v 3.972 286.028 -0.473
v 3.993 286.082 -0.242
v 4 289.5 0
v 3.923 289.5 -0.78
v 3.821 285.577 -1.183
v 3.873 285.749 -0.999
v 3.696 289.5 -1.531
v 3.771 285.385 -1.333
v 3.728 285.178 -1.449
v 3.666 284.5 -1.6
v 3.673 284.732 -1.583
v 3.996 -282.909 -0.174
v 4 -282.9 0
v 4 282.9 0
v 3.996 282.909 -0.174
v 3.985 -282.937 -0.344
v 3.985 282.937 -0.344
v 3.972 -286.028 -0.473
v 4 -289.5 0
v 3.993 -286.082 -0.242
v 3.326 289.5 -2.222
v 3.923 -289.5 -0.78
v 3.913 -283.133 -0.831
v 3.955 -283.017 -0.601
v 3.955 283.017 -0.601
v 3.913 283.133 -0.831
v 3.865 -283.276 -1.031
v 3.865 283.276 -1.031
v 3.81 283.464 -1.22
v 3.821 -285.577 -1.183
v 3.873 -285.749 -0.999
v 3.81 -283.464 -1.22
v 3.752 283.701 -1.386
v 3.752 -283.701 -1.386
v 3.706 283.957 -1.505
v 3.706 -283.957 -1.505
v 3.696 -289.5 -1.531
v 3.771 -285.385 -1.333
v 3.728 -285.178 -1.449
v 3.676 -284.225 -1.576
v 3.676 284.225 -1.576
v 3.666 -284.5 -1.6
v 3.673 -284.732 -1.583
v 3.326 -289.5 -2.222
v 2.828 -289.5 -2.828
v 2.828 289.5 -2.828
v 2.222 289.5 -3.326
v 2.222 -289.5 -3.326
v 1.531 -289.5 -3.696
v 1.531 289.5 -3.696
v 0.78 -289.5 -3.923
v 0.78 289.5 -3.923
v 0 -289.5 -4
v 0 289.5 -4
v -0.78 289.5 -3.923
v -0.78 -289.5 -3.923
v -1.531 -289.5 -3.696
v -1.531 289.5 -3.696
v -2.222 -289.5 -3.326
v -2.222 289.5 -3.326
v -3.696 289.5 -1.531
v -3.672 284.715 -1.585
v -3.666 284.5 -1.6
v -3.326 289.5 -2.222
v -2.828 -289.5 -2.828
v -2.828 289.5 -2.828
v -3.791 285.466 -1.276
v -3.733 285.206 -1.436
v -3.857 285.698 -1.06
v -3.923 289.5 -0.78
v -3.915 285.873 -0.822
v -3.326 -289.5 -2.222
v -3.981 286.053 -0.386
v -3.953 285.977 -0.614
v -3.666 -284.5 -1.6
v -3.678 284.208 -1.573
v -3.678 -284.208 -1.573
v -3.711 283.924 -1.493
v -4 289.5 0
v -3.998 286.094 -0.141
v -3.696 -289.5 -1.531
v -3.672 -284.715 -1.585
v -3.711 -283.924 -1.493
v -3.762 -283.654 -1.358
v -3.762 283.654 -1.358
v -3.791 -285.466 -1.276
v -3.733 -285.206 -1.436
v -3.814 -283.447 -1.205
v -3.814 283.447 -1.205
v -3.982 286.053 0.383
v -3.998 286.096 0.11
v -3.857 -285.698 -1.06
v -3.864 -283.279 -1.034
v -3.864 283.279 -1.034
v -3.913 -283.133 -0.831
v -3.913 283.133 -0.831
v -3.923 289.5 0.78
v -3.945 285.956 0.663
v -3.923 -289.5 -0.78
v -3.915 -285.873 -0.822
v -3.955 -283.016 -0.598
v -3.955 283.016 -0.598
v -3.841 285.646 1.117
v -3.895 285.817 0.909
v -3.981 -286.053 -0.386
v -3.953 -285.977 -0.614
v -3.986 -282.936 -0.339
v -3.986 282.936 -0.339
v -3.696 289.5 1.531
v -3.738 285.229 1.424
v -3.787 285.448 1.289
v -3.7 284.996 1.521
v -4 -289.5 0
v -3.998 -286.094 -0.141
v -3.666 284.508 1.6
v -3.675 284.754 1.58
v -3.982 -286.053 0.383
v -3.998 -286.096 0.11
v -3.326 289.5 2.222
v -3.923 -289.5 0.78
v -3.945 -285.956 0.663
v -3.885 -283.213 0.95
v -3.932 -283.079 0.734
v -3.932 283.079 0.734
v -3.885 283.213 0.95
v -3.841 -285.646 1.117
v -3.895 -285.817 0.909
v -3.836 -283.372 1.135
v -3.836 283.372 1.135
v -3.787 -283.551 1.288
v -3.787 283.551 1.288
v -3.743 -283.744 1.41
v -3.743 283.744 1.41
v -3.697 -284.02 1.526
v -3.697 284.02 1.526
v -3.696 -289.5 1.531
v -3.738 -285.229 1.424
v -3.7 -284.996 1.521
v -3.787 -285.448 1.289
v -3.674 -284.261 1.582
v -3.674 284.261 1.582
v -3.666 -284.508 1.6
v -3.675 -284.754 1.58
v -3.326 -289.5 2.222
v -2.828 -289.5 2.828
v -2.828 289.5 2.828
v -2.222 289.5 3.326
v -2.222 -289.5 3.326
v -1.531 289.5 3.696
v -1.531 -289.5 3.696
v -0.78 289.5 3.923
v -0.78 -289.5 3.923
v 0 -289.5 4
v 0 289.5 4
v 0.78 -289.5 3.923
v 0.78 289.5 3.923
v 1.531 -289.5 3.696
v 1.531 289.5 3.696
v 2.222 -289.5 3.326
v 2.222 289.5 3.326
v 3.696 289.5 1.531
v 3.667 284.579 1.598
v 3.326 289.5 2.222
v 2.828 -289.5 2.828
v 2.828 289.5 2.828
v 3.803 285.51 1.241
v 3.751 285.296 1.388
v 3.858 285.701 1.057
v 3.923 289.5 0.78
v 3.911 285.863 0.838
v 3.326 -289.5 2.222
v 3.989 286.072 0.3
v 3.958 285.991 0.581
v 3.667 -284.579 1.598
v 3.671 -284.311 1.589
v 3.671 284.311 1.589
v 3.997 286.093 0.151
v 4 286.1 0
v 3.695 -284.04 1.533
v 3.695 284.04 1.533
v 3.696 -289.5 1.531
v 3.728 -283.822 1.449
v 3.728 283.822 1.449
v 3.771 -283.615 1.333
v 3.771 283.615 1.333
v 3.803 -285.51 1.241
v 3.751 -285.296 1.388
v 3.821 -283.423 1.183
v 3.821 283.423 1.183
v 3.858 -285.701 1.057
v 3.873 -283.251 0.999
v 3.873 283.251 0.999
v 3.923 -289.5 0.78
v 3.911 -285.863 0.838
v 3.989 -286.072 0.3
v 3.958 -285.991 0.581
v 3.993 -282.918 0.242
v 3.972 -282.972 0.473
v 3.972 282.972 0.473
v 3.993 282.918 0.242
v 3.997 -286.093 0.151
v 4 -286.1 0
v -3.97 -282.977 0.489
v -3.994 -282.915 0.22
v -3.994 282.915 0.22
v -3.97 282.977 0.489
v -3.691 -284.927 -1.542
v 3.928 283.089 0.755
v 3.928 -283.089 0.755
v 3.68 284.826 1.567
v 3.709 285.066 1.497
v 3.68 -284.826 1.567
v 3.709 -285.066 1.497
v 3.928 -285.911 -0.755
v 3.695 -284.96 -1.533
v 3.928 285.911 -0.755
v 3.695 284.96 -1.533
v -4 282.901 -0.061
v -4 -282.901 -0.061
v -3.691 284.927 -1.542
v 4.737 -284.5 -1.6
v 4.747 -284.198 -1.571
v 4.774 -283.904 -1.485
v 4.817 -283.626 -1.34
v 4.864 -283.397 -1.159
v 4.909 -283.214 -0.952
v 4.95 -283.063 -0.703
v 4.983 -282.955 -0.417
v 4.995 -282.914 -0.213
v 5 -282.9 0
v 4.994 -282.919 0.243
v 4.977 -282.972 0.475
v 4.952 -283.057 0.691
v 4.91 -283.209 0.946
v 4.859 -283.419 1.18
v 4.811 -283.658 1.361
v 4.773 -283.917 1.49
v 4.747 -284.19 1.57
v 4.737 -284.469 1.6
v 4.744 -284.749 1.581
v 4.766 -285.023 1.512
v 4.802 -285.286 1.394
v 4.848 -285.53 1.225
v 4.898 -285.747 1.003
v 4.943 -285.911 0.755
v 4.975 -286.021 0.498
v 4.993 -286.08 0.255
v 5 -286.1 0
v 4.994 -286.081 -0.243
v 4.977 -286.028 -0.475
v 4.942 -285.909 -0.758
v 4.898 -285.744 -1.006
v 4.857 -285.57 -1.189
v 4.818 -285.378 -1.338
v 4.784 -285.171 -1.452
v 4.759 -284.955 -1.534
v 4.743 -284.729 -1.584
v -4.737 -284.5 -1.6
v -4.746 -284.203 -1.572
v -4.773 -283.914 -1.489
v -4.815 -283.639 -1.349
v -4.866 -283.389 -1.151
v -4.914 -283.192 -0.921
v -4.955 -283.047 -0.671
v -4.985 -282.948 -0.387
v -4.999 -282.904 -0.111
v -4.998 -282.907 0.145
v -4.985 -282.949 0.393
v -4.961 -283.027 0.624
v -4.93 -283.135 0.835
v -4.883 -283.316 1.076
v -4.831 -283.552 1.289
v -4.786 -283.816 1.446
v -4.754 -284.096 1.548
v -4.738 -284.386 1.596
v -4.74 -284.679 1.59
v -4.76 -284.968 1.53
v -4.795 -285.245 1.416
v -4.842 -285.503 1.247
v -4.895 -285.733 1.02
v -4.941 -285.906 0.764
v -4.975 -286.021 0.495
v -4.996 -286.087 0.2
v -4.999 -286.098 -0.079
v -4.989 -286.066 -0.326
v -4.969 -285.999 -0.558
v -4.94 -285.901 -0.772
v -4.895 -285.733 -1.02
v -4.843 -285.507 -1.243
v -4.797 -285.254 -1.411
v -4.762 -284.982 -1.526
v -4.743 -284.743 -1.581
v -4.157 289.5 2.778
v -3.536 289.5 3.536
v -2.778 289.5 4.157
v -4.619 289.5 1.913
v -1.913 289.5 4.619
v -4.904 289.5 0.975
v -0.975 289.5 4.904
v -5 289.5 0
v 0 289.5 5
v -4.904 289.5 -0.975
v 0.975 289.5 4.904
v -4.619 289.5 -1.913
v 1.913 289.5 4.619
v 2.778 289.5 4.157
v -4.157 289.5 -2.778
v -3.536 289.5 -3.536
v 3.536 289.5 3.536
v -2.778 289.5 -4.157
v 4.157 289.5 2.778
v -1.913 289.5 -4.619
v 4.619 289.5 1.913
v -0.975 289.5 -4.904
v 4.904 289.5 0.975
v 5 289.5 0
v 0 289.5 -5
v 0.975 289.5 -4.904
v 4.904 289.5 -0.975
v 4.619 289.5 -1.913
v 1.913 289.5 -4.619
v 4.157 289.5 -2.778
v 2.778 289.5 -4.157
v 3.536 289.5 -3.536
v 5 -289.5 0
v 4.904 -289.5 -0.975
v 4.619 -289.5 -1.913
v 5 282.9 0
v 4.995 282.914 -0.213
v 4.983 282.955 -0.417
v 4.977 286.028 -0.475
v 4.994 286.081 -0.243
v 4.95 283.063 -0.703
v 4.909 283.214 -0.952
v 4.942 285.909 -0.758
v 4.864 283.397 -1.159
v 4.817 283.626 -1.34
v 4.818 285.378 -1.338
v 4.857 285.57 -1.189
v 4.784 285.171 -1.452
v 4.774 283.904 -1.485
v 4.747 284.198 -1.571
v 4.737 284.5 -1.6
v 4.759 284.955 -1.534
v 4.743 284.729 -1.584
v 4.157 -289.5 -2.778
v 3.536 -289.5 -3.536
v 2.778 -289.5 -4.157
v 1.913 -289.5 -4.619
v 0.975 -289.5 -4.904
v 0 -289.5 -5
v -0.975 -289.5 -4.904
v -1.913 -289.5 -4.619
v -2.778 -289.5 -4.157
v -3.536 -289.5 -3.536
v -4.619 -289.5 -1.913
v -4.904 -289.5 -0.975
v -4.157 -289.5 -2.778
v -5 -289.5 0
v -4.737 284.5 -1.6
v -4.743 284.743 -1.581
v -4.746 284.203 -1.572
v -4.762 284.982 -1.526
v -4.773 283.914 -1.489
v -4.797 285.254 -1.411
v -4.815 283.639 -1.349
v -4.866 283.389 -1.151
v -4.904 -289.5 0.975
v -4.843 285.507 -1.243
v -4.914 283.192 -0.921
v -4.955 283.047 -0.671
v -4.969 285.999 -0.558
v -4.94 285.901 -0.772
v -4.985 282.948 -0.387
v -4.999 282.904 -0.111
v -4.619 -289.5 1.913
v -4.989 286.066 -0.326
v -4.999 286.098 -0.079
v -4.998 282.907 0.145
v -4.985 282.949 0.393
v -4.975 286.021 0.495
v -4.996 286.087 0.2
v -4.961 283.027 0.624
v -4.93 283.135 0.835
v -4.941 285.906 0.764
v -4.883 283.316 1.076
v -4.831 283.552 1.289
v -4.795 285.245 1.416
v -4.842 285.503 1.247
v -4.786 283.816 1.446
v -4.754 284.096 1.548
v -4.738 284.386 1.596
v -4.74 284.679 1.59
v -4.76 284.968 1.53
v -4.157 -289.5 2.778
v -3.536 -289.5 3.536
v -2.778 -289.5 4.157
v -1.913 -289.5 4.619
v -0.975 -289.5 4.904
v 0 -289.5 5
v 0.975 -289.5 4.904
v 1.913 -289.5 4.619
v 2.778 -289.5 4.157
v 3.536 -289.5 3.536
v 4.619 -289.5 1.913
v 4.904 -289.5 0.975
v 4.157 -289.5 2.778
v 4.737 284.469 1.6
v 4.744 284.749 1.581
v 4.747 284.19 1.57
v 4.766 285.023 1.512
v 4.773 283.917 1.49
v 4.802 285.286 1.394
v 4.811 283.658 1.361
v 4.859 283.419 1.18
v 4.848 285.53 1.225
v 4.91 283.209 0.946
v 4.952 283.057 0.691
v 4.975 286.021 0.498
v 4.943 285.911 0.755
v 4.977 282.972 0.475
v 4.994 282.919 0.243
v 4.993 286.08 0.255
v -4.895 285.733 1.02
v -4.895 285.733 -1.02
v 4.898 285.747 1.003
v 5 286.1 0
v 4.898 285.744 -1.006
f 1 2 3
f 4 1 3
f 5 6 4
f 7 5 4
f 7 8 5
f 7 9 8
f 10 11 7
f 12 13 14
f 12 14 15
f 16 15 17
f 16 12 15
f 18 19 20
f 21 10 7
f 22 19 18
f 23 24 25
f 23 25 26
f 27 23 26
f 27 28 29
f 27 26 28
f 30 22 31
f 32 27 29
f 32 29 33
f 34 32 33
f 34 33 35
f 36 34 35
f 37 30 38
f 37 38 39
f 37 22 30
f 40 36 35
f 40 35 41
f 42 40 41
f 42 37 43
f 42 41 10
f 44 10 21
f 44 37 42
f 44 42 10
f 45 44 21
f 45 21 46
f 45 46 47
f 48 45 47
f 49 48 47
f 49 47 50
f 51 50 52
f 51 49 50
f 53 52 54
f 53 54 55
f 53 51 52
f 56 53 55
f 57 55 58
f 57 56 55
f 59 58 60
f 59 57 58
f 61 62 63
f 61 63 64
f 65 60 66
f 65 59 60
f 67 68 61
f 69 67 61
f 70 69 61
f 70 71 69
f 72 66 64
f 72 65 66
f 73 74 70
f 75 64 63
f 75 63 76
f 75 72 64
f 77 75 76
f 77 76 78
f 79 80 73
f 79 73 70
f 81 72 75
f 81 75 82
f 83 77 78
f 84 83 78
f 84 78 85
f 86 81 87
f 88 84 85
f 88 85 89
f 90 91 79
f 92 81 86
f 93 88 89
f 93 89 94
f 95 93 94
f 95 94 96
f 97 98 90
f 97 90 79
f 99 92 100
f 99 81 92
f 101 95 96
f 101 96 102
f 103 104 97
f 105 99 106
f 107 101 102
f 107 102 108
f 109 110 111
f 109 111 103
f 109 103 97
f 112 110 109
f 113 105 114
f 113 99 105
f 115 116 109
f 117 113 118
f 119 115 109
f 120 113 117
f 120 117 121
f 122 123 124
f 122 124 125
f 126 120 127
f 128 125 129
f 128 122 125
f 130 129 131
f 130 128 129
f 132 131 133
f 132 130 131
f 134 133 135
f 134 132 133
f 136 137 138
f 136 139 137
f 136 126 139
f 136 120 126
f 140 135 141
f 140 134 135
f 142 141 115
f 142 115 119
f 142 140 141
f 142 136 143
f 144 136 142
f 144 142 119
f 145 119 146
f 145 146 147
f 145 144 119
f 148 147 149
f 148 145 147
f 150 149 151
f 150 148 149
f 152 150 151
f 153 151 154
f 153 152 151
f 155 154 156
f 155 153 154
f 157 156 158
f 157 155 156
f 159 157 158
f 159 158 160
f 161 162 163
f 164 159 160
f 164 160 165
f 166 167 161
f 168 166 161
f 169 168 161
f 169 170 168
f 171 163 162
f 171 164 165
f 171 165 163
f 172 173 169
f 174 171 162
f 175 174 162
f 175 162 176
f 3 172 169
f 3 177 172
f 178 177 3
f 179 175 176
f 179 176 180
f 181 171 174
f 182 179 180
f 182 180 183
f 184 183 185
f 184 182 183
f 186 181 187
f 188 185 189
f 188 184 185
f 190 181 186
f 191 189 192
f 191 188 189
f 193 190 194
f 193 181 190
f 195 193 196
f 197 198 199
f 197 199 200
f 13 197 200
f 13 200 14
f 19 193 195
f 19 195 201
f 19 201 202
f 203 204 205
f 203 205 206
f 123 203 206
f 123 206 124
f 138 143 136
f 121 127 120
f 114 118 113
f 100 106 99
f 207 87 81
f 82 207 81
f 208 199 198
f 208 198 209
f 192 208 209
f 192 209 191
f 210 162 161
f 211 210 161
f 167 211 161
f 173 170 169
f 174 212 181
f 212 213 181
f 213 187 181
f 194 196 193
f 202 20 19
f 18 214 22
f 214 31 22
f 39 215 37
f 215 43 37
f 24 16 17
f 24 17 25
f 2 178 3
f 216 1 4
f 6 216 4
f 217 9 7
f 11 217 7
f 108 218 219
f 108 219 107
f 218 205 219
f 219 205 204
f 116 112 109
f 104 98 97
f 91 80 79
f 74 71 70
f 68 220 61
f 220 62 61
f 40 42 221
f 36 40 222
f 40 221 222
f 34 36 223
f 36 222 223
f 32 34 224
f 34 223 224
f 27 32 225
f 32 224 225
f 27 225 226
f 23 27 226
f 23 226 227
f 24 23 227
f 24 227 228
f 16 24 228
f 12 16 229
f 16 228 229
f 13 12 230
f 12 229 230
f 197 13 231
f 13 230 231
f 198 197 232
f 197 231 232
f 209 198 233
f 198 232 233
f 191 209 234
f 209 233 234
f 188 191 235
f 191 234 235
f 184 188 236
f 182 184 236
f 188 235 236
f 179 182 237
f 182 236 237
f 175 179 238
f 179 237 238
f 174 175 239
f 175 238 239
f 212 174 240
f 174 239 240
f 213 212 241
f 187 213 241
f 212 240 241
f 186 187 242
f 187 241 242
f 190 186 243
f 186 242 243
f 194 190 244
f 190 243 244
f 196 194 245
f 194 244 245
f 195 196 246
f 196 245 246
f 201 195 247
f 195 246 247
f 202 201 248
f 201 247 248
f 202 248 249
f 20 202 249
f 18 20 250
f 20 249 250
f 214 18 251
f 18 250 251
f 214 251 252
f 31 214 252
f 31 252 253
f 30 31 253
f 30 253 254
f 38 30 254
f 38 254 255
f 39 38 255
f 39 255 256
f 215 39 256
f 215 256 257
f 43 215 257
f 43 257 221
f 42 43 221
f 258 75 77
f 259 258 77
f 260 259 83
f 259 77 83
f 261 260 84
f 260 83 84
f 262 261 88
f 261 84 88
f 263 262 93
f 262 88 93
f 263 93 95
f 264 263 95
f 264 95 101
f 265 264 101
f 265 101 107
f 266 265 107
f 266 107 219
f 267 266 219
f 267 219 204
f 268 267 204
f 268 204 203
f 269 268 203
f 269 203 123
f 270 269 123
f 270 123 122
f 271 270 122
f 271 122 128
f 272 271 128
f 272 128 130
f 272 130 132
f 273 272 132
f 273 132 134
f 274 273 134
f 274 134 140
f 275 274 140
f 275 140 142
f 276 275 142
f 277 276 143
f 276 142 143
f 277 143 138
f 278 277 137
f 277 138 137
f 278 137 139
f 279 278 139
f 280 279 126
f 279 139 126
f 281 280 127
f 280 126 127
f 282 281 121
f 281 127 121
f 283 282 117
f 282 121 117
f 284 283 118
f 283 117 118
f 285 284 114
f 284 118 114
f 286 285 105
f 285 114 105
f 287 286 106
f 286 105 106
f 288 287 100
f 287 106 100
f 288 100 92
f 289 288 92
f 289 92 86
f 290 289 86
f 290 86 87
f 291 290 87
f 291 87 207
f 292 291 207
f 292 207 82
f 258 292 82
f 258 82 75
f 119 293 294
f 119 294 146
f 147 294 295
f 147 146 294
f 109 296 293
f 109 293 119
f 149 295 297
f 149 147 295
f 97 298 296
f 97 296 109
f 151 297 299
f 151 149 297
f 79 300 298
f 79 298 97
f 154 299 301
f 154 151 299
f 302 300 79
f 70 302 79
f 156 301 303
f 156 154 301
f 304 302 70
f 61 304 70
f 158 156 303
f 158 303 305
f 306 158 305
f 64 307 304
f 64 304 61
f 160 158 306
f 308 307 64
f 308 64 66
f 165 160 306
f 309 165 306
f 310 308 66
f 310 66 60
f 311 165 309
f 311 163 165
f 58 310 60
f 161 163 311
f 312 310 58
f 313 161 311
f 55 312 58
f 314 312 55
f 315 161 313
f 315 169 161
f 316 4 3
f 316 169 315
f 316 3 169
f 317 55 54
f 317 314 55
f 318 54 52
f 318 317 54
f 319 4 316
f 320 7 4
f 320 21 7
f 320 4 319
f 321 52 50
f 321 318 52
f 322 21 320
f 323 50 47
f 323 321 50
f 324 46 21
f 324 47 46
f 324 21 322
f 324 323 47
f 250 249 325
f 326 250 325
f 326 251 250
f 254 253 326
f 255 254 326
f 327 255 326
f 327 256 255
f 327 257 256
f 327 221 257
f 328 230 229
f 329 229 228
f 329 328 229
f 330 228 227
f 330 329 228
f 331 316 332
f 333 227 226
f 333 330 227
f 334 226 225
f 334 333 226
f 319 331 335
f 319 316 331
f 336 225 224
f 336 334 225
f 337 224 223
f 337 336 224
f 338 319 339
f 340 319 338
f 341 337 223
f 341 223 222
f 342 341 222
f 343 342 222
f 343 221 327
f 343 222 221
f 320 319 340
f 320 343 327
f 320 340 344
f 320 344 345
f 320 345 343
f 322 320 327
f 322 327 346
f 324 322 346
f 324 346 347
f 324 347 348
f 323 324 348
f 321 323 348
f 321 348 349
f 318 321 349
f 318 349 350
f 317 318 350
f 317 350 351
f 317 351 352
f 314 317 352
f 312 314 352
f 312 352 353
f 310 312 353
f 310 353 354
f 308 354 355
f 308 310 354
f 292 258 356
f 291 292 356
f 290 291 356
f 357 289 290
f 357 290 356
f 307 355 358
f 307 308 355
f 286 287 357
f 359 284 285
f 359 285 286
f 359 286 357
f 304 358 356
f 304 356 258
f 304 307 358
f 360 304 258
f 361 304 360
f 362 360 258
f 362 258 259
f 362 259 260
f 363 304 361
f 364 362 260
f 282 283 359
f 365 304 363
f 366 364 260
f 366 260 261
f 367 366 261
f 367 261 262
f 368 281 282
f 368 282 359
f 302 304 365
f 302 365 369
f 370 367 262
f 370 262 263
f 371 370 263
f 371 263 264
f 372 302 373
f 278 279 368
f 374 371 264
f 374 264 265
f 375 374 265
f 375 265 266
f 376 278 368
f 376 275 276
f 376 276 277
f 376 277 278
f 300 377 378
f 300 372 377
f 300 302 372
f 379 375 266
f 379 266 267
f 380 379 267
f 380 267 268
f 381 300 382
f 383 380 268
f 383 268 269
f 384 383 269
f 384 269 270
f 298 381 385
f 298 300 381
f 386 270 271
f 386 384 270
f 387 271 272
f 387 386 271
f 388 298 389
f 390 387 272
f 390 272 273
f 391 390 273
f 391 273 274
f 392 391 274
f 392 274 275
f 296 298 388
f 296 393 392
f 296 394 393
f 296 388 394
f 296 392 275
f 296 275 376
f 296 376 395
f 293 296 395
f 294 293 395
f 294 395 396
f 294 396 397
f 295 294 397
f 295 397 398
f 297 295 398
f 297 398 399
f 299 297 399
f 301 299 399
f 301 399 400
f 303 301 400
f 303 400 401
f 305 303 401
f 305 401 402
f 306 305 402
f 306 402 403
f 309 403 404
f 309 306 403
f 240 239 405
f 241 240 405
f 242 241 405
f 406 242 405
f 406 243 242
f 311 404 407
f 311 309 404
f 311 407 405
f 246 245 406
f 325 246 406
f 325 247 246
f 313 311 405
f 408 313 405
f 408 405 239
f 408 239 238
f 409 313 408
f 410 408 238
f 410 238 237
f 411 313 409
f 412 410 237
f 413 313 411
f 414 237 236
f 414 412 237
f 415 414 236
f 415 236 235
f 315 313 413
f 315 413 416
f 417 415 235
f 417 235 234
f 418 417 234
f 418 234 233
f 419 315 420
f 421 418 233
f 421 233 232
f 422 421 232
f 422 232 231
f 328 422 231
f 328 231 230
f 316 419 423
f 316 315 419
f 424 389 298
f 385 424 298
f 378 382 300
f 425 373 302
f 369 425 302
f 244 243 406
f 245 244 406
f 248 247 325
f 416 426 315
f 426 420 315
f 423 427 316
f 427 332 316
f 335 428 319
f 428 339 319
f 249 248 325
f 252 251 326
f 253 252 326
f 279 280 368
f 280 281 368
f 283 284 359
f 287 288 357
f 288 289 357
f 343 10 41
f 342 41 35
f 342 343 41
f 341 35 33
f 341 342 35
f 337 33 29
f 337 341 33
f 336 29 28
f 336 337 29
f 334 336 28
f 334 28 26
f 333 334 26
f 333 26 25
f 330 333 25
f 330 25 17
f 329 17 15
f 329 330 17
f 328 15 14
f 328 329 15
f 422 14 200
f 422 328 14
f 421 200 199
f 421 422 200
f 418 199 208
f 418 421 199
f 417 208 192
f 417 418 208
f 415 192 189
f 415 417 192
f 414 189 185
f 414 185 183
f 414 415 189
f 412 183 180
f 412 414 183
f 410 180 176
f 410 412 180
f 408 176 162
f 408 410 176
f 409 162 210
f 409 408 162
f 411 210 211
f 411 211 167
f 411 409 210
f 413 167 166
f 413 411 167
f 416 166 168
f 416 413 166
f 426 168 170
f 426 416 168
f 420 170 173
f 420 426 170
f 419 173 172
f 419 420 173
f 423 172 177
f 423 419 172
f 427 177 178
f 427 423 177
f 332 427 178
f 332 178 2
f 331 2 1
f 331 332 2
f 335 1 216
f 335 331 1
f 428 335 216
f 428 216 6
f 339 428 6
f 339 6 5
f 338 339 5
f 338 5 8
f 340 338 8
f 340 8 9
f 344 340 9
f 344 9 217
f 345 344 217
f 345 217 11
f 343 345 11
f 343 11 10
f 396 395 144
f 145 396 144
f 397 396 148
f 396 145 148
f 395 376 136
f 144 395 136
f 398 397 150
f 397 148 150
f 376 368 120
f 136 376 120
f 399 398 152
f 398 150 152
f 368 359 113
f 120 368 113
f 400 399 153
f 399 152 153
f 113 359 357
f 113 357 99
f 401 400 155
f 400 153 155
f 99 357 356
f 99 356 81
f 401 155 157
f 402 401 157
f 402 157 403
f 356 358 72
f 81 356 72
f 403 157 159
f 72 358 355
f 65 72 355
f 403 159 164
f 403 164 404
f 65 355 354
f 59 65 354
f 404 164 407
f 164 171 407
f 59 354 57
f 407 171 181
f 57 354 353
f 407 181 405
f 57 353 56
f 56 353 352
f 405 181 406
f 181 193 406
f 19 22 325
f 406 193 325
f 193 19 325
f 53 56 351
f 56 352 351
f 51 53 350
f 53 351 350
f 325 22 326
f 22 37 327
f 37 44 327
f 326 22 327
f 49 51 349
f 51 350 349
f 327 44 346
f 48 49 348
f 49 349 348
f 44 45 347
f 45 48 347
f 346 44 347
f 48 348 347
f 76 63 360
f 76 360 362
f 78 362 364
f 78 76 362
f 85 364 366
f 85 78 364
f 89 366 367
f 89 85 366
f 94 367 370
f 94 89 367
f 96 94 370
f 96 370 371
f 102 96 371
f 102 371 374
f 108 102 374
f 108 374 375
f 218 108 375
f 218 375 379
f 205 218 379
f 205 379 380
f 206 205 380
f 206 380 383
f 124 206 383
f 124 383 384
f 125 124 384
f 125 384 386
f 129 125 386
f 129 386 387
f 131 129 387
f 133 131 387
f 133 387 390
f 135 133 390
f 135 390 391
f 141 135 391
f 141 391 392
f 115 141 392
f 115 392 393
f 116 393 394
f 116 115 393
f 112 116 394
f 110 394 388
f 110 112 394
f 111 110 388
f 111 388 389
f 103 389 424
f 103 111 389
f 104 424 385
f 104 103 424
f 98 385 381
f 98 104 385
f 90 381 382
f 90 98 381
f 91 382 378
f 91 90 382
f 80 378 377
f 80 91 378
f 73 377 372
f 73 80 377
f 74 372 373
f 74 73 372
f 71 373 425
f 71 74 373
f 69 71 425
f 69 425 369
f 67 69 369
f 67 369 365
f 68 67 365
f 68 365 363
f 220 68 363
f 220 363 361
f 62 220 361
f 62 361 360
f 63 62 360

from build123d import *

# Parameters (mm, degrees)
SKETCH1_R            = 5
SKETCH1_R_2          = 4
BOSS_EXTRUDE1_DEPTH  = 289.5
M3_CLEARANCE_HOLE1_D = 3.2


with BuildPart() as part:
    # Sketch1 → Boss-Extrude1 (new, symmetric)
    with BuildSketch(Plane(origin=(0, 0, 0), x_dir=(1, 0, 0), z_dir=(0, 1, 0))):
        Circle(SKETCH1_R)
        Circle(SKETCH1_R_2, mode=Mode.SUBTRACT)
    extrude(amount=BOSS_EXTRUDE1_DEPTH, both=True)

    # M3 Clearance Hole1 (through all)
    with Locations(Plane.ZY.offset(5)):
        with Locations((0, -284.5)):
            m3_clearance_hole1 = Hole(M3_CLEARANCE_HOLE1_D / 2)

    # Mirror1: M3 Clearance Hole1 across plane
    add(m3_clearance_hole1.mirror(Plane.ZX), mode=Mode.SUBTRACT)


solid = part.part
